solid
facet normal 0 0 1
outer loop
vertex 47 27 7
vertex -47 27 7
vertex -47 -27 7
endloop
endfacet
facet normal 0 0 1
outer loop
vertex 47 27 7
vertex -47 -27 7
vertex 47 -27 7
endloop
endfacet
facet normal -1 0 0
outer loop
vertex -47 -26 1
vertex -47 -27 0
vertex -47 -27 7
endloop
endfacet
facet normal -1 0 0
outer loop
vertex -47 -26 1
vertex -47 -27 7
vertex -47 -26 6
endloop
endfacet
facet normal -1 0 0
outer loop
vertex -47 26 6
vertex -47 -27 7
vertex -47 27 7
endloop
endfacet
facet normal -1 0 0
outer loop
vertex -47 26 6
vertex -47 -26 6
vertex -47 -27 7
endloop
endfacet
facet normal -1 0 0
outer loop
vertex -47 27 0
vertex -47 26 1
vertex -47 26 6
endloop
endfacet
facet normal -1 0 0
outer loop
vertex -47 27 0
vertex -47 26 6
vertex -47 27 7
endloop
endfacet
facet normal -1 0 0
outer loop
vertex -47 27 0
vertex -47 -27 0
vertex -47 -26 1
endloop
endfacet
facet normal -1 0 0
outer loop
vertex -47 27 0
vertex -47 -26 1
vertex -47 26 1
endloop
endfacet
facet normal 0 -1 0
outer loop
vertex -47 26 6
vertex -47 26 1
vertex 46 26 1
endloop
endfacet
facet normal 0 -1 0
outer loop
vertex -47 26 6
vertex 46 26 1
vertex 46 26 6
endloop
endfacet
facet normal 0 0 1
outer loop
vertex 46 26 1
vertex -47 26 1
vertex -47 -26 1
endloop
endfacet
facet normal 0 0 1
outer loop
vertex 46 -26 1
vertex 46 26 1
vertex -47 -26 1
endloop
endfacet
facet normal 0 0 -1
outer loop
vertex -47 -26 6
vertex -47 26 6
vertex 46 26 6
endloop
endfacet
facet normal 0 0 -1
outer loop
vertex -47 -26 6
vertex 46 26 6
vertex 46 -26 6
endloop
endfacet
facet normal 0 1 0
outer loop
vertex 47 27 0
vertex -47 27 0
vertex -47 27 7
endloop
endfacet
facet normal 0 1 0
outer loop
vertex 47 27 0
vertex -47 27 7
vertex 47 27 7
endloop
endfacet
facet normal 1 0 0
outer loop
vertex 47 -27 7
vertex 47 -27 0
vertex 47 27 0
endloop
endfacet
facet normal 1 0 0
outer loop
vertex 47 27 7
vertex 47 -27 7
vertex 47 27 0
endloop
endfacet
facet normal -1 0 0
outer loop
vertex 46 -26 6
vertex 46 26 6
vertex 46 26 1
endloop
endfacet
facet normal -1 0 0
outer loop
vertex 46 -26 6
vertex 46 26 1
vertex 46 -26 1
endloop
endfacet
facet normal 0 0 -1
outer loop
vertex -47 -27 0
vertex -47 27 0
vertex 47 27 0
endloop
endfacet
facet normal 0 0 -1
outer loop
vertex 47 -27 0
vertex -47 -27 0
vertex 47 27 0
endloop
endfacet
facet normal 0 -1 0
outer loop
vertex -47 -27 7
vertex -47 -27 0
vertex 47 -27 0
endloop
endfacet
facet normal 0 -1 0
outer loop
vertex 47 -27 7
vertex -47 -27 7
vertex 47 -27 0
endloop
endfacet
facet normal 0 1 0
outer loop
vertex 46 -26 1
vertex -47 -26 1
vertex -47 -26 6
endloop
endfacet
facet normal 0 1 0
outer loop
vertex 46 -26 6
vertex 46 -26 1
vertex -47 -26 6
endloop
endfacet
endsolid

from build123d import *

# Parameters (mm, degrees)
F1_W     = 94
F1_H     = 54
F2_DEPTH = 7
F3_W     = 52
F3_H     = 5
F4_DEPTH = 93


with BuildPart() as f2:
    # F1 (on Top) → F2 (new body)
    with BuildSketch(Plane.XY):
        Rectangle(F1_W, F1_H)
    extrude(amount=F2_DEPTH)

    # F3 (on face) → F4 (cut, through all)
    with BuildSketch(Plane(origin=(-47, 0, 0), x_dir=(0, -1, 0), z_dir=(-1, 0, 0))):
        with Locations((0, 3.5)):
            Rectangle(F3_W, F3_H)
    extrude(amount=-F4_DEPTH, mode=Mode.SUBTRACT)


solid = f2.part
